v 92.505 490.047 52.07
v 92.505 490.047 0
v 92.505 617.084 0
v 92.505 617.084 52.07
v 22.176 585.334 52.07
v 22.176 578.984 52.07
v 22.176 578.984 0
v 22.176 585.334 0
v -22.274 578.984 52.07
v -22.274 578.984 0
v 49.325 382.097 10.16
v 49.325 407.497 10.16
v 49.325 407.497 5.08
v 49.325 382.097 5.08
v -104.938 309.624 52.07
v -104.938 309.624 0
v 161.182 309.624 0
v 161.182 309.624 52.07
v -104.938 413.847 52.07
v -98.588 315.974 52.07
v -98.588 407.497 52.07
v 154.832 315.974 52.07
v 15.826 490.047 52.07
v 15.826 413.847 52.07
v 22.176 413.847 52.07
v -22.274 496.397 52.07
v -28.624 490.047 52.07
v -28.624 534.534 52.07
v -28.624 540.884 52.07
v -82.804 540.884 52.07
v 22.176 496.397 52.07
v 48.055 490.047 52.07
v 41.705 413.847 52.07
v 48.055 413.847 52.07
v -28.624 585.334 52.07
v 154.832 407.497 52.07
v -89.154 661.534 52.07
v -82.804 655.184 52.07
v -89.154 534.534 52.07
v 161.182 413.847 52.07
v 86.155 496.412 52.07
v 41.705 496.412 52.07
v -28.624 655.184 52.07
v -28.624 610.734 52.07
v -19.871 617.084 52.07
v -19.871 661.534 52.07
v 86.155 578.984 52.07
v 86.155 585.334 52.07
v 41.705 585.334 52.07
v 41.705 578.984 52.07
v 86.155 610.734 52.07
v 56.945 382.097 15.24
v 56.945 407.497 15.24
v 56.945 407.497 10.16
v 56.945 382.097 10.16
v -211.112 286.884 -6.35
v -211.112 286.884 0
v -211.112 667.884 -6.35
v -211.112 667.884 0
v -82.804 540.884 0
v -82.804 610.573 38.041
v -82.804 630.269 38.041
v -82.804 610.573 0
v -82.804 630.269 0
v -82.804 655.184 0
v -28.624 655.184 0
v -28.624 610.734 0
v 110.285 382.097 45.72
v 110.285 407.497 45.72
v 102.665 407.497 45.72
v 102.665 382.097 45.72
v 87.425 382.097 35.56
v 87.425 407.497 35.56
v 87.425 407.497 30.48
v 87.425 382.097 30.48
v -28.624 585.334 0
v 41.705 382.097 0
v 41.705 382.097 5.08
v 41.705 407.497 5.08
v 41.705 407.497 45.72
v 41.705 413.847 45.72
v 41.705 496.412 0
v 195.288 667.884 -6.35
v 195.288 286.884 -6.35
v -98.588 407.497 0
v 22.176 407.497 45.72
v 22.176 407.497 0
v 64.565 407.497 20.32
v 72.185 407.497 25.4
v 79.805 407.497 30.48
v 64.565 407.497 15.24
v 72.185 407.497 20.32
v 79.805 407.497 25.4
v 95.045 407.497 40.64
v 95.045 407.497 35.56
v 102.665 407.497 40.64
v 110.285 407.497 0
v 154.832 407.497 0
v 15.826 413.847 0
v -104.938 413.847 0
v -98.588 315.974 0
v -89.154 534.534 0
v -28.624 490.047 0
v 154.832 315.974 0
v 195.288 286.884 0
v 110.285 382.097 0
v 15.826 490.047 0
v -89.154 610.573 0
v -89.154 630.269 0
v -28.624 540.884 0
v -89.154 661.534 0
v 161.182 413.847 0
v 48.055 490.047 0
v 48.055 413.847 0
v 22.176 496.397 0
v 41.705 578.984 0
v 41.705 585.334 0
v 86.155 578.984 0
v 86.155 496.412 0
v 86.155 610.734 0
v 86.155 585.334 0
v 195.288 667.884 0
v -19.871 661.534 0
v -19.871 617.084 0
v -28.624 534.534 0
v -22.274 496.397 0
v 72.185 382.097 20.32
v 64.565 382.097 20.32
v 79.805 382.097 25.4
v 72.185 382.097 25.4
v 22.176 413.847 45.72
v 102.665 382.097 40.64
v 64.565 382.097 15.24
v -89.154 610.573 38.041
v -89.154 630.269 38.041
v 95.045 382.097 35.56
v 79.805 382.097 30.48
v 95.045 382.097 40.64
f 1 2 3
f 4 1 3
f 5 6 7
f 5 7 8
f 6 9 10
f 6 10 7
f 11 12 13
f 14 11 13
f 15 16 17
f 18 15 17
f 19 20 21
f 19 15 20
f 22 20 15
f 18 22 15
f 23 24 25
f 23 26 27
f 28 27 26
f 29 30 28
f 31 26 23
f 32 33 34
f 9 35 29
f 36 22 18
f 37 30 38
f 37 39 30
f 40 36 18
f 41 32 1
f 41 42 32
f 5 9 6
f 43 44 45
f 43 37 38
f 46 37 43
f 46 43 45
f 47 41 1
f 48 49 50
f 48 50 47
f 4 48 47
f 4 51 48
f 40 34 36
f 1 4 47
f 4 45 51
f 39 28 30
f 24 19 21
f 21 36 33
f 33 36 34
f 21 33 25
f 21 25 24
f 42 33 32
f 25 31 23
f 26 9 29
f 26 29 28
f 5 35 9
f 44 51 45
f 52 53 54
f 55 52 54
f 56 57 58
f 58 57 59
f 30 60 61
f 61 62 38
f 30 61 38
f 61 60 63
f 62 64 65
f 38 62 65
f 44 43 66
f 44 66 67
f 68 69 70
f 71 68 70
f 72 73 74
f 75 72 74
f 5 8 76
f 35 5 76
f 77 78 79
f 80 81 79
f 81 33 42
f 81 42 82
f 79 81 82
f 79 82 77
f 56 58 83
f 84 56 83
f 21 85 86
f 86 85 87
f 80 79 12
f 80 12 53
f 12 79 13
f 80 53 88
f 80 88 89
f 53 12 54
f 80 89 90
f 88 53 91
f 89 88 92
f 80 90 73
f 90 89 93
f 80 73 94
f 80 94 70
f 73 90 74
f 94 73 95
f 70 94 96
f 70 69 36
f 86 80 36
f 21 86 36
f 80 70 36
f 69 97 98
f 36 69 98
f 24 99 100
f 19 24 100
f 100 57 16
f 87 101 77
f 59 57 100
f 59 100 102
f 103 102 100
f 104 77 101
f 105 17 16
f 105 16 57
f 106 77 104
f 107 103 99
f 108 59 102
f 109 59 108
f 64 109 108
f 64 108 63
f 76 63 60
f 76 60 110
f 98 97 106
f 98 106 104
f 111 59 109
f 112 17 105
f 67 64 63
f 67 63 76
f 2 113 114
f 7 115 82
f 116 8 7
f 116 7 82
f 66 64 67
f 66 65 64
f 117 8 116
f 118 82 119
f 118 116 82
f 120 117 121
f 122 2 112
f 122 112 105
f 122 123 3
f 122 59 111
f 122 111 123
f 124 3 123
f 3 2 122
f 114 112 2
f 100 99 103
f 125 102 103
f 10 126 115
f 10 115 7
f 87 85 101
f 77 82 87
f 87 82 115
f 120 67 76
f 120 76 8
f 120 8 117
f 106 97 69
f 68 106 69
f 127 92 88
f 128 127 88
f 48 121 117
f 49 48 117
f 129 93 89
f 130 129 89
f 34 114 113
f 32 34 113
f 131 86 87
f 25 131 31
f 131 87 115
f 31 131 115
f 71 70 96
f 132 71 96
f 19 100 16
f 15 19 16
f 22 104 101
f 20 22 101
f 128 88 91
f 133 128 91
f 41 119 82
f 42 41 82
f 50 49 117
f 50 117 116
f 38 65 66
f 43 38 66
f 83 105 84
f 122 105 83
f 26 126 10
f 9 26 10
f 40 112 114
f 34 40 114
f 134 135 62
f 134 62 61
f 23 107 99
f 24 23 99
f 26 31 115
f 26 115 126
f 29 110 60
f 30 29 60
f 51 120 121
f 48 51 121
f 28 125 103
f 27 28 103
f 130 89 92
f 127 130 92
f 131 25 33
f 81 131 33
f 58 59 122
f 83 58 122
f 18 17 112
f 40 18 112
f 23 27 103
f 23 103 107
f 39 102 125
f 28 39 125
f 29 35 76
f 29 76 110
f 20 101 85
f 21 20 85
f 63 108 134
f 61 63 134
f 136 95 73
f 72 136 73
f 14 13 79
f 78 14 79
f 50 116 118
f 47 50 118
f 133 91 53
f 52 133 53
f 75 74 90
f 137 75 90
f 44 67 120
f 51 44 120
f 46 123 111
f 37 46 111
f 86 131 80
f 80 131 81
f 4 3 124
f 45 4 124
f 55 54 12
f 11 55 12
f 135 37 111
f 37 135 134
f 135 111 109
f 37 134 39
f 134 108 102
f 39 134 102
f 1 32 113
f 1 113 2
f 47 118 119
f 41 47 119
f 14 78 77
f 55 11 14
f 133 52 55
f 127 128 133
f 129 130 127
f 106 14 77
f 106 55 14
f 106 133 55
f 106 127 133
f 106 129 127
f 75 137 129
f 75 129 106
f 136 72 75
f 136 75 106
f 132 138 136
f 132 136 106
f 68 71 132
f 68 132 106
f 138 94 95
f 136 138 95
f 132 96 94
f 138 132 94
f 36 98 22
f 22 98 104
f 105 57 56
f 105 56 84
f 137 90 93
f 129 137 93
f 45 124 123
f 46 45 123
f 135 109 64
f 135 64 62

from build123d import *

# Parameters (mm, degrees)
F0_W     = 406.4
F0_H     = 381
F1_DEPTH = 6.35
F3_DEPTH = 52.07
F4_W     = 19.6954607964
F4_H     = 38.0410514772
F5_DEPTH = 25.4
F7_DEPTH = 25.4
F8_W     = 266.1207329154
F8_H     = 104.222646597
F8_W_2   = 253.4207329154
F8_H_2   = 91.522646597
F9_DEPTH = 6.35


with BuildPart() as f1:
    # F0 (on Top) → F1 (new body)
    with BuildSketch(Plane.XY):
        with Locations((-7.9120187303, 477.383510977)):
            Rectangle(F0_W, F0_H)
    extrude(amount=-F1_DEPTH)

    # F2 (on face) → F3 (join)
    with BuildSketch(Plane.XY):
        Polygon((-89.1544180155, 661.533510977), (-89.1544180155, 534.533510977), (-28.623964709, 534.533510977), (-28.623964709, 490.0471397191), (15.826035291, 490.0471397191), (15.826035291, 413.8471397191), (-104.9383804202, 413.8471397191), (-104.9383804202, 309.6244931221), (161.1823524952, 309.6244931221), (161.1823524952, 413.8471397191), (48.055235368, 413.8471397191), (48.055235368, 490.0471397191), (92.505235368, 490.0471397191), (92.505235368, 585.333510977), (92.505235368, 610.733510977), (92.505235368, 617.083510977), (-19.8705563486, 617.083510977), (-19.8705563486, 661.533510977), align=None)
        Polygon((22.176035291, 585.333510977), (-28.623964709, 585.333510977), (-28.623964709, 540.883510977), (-82.8044180155, 540.883510977), (-82.8044180155, 655.183510977), (-28.623964709, 655.183510977), (-28.623964709, 610.733510977), (86.155235368, 610.733510977), (86.155235368, 585.333510977), (41.705235368, 585.333510977), (41.705235368, 578.983510977), (86.155235368, 578.983510977), (86.155235368, 496.4115063727), (41.705235368, 496.4115063727), (41.705235368, 490.0471397191), (41.705235368, 407.4971397191), (154.8323524952, 407.4971397191), (154.8323524952, 315.9744931221), (-98.5883804202, 315.9744931221), (-98.5883804202, 407.4971397191), (22.176035291, 407.4971397191), (22.176035291, 490.0471397191), (22.176035291, 496.3971397191), (-22.273964709, 496.3971397191), (-22.273964709, 578.983510977), (22.176035291, 578.983510977), align=None, mode=Mode.SUBTRACT)
    extrude(amount=F3_DEPTH)

    # F4 (on face) → F5 (cut)
    with BuildSketch(Plane(origin=(-89.1544180155, 0, 0), x_dir=(0, -1, 0), z_dir=(-1, 0, 0))):
        with Locations((-620.421141386, 19.0205257386)):
            Rectangle(F4_W, F4_H)
    extrude(amount=-F5_DEPTH, mode=Mode.SUBTRACT)

    # F6 (on face) → F7 (join)
    with BuildSketch(Plane.XZ.offset(-407.4971397191)):
        Polygon((41.705235368, 5.08), (41.705235368, 0), (110.285235368, 0), (110.285235368, 45.72), (102.665235368, 45.72), (102.665235368, 40.64), (95.045235368, 40.64), (95.045235368, 35.56), (87.425235368, 35.56), (87.425235368, 30.48), (79.805235368, 30.48), (79.805235368, 25.4), (72.185235368, 25.4), (72.185235368, 20.32), (64.565235368, 20.32), (64.565235368, 15.24), (56.945235368, 15.24), (56.945235368, 10.16), (49.325235368, 10.16), (49.325235368, 5.08), align=None)
    extrude(amount=F7_DEPTH)

    # F8 (on face) → F9 (join)
    with BuildSketch(Plane.XY.offset(52.07)):
        with Locations((28.1219860375, 361.7358164206)):
            Rectangle(F8_W, F8_H)
        with Locations((28.1219860375, 361.7358164206)):
            Rectangle(F8_W_2, F8_H_2, mode=Mode.SUBTRACT)
    extrude(amount=-F9_DEPTH)


solid = f1.part
